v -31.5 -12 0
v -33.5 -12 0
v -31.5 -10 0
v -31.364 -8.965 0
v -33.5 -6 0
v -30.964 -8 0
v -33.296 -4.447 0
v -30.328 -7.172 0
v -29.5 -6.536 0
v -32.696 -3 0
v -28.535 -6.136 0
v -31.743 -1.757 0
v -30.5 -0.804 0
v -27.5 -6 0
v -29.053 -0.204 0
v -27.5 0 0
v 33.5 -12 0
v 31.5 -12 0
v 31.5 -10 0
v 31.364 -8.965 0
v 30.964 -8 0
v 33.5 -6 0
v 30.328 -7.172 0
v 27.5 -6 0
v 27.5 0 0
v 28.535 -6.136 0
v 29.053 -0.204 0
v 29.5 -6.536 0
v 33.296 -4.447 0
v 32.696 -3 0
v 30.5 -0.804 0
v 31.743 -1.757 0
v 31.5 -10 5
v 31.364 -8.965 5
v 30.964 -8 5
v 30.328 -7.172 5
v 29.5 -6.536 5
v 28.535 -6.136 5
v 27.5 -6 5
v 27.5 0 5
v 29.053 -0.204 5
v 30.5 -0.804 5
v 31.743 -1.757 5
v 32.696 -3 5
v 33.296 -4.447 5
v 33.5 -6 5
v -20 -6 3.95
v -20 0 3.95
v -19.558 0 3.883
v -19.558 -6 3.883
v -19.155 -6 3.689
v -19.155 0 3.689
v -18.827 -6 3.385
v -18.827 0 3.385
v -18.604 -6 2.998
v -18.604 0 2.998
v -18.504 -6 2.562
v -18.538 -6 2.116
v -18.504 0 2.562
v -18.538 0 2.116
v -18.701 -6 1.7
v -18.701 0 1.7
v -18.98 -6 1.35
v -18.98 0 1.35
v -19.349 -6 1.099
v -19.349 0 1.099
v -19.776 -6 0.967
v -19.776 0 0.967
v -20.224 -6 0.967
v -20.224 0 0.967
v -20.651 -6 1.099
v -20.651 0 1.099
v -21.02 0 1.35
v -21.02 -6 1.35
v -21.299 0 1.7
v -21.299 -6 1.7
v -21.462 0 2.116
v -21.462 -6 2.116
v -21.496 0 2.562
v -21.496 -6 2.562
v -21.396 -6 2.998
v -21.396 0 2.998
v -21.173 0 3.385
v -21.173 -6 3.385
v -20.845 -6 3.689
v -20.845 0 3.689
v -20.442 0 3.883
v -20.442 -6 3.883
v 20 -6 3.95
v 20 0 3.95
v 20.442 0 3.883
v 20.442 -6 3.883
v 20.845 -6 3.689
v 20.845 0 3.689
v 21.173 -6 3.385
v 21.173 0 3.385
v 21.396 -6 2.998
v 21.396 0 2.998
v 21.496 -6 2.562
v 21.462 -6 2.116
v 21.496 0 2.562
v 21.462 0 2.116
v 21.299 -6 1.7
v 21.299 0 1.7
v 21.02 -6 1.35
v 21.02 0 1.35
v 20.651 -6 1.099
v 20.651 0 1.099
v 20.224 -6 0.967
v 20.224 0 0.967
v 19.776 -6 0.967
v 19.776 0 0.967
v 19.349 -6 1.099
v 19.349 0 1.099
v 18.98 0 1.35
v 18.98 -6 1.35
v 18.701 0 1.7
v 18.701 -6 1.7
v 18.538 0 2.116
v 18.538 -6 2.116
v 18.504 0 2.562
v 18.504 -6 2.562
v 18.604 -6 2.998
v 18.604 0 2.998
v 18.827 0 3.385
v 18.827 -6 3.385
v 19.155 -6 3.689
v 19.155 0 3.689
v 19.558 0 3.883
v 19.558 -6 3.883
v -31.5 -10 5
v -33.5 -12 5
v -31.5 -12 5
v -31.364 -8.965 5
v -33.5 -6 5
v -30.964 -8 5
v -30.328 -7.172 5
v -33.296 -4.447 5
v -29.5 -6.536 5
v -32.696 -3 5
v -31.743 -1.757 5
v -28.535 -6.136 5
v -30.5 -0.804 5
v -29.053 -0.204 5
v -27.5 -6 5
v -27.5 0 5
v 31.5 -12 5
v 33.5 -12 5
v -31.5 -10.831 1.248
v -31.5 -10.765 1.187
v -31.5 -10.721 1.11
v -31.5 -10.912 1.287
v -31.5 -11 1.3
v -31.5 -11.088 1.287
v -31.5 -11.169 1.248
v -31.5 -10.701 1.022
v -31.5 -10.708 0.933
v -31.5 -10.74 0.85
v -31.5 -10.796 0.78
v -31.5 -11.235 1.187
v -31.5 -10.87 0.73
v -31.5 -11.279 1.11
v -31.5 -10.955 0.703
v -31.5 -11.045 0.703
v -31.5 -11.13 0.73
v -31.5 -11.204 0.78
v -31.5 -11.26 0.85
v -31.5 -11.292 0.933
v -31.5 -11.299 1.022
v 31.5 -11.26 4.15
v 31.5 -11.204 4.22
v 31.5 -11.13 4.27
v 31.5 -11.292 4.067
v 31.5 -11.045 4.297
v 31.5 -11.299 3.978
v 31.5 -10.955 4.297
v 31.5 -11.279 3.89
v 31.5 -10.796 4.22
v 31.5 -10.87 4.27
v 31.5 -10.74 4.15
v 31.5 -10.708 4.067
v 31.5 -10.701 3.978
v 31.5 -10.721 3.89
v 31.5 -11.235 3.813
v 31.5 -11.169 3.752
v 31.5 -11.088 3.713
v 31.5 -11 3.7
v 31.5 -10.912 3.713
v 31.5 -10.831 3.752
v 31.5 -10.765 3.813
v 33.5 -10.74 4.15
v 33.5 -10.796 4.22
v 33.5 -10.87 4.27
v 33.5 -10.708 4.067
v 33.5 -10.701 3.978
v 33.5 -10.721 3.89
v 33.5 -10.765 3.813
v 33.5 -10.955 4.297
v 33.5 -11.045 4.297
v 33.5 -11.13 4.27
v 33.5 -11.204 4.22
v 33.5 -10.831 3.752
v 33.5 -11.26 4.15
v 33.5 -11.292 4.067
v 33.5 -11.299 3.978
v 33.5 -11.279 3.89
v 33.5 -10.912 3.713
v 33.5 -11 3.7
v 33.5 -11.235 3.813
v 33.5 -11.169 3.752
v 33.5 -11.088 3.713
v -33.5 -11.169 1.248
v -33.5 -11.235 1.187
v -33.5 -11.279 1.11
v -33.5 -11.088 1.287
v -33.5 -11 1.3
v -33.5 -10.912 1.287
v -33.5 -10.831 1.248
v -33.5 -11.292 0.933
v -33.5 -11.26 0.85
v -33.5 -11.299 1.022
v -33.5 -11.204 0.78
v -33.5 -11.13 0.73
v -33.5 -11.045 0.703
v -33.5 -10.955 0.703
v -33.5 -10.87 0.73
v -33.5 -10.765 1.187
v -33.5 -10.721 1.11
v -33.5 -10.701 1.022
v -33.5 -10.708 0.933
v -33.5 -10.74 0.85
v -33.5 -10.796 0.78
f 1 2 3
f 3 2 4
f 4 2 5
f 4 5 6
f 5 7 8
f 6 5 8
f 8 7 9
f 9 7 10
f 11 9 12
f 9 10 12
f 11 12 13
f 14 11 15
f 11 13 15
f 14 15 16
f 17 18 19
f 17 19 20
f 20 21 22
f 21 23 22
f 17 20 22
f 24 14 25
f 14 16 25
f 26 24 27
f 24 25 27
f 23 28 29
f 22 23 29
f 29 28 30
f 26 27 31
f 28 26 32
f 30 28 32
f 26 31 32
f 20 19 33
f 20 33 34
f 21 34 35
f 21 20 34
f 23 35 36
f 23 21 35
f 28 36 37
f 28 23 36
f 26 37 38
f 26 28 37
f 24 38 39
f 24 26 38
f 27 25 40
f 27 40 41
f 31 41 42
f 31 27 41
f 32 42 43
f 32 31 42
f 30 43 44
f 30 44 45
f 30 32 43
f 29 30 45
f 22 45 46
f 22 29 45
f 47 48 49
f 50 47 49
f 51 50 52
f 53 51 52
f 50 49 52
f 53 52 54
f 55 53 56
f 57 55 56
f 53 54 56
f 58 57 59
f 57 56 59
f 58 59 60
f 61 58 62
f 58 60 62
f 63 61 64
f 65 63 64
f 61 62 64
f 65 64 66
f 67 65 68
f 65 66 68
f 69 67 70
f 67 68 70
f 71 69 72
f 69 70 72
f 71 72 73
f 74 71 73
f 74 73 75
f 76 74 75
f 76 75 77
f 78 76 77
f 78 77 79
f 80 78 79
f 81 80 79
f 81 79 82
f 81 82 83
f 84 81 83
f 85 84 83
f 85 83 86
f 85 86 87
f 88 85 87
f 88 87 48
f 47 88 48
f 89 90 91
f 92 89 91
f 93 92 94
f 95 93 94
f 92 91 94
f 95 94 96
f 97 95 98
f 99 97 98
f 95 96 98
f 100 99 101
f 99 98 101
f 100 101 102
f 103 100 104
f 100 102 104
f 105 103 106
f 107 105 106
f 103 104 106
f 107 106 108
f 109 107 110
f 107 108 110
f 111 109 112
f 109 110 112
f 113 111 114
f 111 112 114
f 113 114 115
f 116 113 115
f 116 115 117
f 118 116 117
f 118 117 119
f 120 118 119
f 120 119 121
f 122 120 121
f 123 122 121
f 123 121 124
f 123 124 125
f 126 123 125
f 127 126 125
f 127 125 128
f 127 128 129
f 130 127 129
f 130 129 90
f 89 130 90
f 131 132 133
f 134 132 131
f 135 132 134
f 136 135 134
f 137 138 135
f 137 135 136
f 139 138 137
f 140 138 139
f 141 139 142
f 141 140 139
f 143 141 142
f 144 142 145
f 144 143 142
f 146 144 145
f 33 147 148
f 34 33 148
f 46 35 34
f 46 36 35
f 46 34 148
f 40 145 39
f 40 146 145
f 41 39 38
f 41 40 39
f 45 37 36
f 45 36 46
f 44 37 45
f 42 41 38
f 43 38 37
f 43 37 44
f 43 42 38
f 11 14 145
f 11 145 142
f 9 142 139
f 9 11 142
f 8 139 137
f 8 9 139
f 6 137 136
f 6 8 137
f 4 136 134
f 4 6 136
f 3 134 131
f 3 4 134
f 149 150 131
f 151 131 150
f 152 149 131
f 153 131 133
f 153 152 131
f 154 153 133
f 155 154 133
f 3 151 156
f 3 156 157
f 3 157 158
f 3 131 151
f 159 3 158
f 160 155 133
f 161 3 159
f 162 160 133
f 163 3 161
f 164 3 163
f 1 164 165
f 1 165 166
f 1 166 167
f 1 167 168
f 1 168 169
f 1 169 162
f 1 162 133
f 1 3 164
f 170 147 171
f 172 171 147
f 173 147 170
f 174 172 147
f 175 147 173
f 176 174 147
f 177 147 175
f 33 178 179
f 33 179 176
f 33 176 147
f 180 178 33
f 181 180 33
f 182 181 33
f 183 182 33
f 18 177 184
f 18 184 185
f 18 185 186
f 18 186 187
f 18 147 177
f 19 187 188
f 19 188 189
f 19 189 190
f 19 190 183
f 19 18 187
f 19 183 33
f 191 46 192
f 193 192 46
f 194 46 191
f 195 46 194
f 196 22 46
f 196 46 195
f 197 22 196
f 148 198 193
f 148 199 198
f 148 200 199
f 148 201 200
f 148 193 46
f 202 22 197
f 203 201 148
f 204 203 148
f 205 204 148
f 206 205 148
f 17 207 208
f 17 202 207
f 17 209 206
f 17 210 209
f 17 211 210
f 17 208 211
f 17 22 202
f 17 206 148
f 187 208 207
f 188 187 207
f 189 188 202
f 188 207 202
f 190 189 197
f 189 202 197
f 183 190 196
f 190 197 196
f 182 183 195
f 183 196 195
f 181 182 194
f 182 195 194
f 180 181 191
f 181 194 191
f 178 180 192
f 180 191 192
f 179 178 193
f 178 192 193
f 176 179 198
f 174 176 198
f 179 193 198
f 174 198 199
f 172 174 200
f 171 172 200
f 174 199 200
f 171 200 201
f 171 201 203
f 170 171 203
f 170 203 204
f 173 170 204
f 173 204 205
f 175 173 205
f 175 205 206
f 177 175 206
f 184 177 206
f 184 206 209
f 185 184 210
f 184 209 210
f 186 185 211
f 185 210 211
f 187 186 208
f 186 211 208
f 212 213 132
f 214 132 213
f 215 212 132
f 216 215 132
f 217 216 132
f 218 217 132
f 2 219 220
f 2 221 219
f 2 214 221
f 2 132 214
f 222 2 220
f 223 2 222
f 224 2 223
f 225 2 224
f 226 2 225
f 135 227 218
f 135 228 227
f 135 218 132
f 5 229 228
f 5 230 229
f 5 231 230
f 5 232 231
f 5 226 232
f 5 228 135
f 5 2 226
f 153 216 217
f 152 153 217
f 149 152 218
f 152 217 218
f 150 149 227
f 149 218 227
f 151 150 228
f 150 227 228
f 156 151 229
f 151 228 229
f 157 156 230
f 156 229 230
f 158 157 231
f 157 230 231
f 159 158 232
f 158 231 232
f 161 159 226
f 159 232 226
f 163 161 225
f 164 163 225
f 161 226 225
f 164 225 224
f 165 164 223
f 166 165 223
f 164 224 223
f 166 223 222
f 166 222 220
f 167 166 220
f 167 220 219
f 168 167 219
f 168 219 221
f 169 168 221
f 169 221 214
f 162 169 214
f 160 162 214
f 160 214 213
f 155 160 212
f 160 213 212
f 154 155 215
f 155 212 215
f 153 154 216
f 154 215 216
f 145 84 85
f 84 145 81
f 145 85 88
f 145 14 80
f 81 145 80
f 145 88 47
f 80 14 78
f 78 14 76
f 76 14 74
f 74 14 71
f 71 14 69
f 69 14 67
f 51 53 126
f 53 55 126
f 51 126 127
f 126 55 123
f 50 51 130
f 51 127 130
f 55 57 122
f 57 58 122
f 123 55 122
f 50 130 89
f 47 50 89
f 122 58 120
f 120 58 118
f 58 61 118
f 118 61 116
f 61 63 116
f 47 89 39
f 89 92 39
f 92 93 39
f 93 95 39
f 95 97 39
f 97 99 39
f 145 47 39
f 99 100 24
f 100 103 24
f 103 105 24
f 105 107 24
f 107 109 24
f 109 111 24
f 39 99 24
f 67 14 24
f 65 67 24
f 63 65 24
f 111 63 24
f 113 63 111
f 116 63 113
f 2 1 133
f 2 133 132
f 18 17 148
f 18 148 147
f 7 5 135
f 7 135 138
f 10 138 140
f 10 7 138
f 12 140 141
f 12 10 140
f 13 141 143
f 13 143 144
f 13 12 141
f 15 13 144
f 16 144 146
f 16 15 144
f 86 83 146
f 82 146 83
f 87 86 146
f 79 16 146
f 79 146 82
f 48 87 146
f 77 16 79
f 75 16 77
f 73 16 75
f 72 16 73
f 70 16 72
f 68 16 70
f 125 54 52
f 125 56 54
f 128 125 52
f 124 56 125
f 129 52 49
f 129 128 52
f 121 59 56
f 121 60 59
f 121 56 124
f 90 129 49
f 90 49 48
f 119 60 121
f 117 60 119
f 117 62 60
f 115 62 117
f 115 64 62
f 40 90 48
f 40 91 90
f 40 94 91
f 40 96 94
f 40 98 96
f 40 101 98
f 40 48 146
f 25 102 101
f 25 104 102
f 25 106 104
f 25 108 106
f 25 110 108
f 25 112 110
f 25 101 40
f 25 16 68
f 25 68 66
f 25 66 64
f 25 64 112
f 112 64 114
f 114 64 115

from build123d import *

# Parameters (mm, degrees)
SKETCH2_W           = 55
SKETCH2_H           = 6
BOSS_EXTRUDE8_DEPTH = 5
SKETCH4_R           = 0.3
CUT_EXTRUDE3_DEPTH  = 2
SKETCH5_R           = 0.3
CUT_EXTRUDE4_DEPTH  = 2
SKETCH6_R           = 1.5
CUT_EXTRUDE5_DEPTH  = 10


with BuildPart() as part:
    # Sketch2 → Boss-Extrude8 (new body)
    with BuildSketch(Plane.XY):
        with Locations((0, -3)):
            Rectangle(SKETCH2_W, SKETCH2_H)
        with BuildLine():
            ThreePointArc((-27.5, -6), (-30.328427125, -7.171572875), (-31.5, -10))
            Line((-31.5, -10), (-31.5, -12))
            Line((-31.5, -12), (-33.5, -12))
            Line((-33.5, -12), (-33.5, -6))
            ThreePointArc((-33.5, -6), (-31.742640687, -1.757359313), (-27.5, 0))
            Line((-27.5, 0), (-27.5, -6))
        make_face()
        with BuildLine():
            Line((27.5, -6), (27.5, 0))
            ThreePointArc((27.5, 0), (31.742640687, -1.757359313), (33.5, -6))
            Line((33.5, -6), (33.5, -12))
            Line((33.5, -12), (31.5, -12))
            Line((31.5, -12), (31.5, -10))
            ThreePointArc((31.5, -10), (30.328427125, -7.171572875), (27.5, -6))
        make_face()
    extrude(amount=BOSS_EXTRUDE8_DEPTH)

    # Sketch4 → Cut-Extrude3 (cut)
    with BuildSketch(Plane(origin=(33.5, 0, 0), x_dir=(0, 0, -1), z_dir=(1, 0, 0))):
        with Locations((-4, -11)):
            Circle(SKETCH4_R)
    extrude(amount=-CUT_EXTRUDE3_DEPTH, mode=Mode.SUBTRACT)

    # Sketch5 → Cut-Extrude4 (cut)
    with BuildSketch(Plane.ZY.offset(33.5)):
        with Locations((1, -11)):
            Circle(SKETCH5_R)
    extrude(amount=-CUT_EXTRUDE4_DEPTH, mode=Mode.SUBTRACT)

    # Sketch6 → Cut-Extrude5 (cut)
    with BuildSketch(Plane(origin=(0, 0, 0), x_dir=(1, 0, 0), z_dir=(0, 1, 0))):
        with Locations(Location((-20, -2.45, 0), (0, 0, 270))):
            Circle(SKETCH6_R)
        with Locations(Location((20, -2.45, 0), (0, 0, 270))):
            Circle(SKETCH6_R)
    extrude(amount=-CUT_EXTRUDE5_DEPTH, mode=Mode.SUBTRACT)


solid = part.part
